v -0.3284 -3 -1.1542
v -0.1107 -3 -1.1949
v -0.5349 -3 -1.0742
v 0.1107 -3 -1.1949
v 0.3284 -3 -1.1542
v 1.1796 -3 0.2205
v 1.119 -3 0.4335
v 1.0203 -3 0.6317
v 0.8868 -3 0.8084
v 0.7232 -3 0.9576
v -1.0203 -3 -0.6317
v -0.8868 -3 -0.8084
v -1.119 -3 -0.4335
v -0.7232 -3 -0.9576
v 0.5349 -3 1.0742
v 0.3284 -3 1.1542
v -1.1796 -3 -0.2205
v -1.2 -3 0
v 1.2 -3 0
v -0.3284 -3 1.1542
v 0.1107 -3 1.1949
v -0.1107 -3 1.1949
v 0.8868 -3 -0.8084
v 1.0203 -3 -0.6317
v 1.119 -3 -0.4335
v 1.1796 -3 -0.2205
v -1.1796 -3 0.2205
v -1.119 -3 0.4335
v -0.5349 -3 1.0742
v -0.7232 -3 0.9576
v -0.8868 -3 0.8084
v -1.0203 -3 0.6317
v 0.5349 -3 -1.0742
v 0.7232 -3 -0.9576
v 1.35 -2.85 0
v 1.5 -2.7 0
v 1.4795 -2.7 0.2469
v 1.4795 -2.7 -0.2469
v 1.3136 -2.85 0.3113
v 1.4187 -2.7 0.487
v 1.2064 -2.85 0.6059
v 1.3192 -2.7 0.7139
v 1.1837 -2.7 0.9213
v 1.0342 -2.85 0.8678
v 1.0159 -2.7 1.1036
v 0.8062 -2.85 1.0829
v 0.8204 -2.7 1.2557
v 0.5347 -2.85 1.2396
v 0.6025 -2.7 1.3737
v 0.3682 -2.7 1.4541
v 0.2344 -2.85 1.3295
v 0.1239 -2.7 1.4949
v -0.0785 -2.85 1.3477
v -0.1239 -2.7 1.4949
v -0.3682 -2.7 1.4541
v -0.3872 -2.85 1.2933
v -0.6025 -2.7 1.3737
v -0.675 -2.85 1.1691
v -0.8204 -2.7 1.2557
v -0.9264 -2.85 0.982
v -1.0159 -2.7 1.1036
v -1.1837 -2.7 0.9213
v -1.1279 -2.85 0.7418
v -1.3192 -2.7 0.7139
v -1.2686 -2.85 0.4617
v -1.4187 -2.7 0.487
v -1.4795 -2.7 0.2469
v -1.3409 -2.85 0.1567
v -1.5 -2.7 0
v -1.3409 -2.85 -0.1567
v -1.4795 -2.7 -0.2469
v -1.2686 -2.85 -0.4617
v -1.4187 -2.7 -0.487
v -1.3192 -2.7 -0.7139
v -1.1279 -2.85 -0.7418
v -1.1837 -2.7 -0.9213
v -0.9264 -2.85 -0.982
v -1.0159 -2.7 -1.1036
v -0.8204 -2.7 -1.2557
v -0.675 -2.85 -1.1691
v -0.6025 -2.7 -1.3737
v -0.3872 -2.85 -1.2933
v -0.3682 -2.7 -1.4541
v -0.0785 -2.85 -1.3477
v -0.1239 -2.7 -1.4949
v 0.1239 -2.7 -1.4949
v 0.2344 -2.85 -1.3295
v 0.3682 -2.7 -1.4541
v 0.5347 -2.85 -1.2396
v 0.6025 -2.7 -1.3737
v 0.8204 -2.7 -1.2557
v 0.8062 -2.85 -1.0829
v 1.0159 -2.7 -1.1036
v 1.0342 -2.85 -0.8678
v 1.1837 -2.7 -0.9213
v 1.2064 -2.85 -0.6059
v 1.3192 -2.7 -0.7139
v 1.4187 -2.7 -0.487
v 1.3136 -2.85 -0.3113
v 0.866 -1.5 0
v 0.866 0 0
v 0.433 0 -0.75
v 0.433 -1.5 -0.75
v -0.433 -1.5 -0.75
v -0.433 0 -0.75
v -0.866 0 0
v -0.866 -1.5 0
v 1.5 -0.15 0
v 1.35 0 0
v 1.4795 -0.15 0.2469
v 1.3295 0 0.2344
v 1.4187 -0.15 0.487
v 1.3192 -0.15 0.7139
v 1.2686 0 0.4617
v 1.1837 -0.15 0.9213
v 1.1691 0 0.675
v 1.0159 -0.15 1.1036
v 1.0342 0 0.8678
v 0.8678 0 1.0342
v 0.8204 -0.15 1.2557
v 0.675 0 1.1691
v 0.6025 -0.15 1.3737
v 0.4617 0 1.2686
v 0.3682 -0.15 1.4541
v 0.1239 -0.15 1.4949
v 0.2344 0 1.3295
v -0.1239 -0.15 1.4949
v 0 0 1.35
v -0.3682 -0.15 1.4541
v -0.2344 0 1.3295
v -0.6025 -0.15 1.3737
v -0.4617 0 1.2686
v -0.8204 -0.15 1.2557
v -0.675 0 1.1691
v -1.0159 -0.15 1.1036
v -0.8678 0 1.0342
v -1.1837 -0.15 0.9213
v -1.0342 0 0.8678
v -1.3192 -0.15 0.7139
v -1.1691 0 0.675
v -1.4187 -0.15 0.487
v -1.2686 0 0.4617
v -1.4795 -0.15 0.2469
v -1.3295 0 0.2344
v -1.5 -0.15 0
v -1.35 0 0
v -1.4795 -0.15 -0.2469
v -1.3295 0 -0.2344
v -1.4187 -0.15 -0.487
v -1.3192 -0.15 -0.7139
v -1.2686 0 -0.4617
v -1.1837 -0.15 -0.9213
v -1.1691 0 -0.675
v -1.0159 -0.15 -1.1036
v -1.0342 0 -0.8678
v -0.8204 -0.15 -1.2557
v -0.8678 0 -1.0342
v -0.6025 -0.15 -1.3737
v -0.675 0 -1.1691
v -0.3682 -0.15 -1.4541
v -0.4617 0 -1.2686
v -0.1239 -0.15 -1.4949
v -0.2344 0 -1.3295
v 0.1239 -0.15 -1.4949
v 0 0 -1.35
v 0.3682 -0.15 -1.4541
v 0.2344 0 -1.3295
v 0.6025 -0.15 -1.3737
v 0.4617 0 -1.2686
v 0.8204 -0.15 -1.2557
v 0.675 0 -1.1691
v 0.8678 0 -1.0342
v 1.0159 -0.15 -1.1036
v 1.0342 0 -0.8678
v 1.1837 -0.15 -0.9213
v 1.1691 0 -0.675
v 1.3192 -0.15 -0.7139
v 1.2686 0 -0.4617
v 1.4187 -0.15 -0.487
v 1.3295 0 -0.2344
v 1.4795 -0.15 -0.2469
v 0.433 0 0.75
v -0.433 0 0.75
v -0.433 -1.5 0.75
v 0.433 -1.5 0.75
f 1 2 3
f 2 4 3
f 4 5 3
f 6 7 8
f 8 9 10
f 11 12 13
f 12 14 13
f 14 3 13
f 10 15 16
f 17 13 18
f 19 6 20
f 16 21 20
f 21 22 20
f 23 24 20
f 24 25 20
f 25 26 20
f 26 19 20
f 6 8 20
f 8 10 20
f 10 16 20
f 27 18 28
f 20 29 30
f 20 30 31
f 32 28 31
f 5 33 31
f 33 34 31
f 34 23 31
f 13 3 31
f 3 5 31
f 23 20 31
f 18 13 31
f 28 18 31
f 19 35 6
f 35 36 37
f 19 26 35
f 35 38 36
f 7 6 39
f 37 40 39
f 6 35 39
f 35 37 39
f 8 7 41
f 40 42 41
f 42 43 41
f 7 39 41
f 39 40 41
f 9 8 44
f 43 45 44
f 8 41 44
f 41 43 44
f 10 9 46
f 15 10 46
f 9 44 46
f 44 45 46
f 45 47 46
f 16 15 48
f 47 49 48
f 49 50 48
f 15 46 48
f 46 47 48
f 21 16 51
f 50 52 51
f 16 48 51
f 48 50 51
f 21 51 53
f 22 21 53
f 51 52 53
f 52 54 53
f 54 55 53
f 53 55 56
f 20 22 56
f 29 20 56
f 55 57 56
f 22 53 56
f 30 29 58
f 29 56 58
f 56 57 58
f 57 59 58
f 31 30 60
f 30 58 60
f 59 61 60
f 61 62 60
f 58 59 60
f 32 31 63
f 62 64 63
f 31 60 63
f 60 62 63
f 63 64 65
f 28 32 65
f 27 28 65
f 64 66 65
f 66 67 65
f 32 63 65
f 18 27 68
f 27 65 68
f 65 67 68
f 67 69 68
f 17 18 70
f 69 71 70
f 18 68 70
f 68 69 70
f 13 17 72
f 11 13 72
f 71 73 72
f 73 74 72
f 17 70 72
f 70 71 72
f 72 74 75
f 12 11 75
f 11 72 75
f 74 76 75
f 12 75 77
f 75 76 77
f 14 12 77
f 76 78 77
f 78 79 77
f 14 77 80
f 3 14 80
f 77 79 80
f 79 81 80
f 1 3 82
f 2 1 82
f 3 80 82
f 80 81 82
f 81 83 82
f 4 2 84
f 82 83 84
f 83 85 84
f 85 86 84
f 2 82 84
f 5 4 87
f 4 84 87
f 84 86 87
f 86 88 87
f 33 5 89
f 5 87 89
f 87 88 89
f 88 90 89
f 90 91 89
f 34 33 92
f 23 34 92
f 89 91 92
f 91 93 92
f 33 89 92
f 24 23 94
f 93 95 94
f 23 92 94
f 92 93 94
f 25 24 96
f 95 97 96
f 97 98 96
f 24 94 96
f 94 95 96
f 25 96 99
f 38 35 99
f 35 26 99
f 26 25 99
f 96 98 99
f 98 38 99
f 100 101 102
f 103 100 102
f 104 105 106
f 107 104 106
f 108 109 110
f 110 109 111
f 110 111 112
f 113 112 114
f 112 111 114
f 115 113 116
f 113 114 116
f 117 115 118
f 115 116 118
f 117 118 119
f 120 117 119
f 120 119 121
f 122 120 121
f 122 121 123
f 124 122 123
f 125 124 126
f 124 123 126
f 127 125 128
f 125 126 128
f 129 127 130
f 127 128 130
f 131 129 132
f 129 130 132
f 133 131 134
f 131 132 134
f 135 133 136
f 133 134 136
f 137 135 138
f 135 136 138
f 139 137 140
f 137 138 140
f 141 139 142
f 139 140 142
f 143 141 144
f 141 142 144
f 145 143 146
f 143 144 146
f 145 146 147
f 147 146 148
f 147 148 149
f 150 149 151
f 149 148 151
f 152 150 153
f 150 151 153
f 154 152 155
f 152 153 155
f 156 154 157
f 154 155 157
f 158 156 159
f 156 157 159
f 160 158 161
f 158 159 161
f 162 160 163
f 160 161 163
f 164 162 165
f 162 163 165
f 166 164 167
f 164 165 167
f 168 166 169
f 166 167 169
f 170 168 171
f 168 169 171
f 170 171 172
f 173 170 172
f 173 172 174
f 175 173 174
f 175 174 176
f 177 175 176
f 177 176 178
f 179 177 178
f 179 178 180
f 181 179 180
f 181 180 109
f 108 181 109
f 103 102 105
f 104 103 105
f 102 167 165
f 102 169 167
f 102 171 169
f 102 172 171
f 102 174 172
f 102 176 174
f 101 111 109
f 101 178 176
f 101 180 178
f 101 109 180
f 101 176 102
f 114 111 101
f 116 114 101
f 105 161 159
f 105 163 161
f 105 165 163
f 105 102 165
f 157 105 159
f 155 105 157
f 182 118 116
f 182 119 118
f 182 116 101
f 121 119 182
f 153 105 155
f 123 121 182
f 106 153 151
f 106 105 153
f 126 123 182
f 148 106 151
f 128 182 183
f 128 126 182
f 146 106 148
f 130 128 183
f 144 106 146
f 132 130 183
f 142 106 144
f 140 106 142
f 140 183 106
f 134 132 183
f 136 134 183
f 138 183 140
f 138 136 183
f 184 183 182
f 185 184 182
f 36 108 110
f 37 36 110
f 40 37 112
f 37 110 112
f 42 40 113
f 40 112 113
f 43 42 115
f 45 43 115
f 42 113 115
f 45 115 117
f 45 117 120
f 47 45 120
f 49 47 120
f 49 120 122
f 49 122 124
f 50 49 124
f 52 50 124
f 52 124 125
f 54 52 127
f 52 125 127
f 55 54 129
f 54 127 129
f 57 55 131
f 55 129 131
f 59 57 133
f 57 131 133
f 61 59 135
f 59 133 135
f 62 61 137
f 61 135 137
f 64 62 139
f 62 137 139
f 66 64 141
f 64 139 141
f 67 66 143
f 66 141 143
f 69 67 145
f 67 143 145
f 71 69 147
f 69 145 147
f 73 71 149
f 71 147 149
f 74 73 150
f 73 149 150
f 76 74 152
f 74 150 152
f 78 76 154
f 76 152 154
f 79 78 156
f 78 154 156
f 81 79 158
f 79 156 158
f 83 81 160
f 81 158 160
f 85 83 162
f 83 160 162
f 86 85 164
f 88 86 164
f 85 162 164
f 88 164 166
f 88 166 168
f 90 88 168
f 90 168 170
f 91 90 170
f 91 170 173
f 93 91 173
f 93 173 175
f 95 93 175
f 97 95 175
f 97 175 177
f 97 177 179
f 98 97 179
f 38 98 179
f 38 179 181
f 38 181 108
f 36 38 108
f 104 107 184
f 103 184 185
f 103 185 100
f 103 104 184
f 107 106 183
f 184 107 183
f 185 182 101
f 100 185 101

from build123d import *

# Parameters (mm, degrees)
CROQUIS1_W            = 1.5
CROQUIS1_H            = 3
CORTAR_EXTRUIR2_DEPTH = 1.5
CHAFL_N3_SIZE         = 0.3
CHAFL_N4_SIZE         = 0.15


with BuildPart() as part:
    # Croquis1 → Revolución1 (revolve)
    with BuildSketch(Plane.XY):
        with Locations((0.75, -1.5)):
            Rectangle(CROQUIS1_W, CROQUIS1_H)
    revolve(axis=Axis((0, 0, 0), (0, -1, 0)))

    # Croquis3 → Cortar-Extruir2 (cut)
    with BuildSketch(Plane(origin=(0, 0, 0), x_dir=(1, 0, 0), z_dir=(0, 1, 0))):
        Polygon((-0.433012702, 0.75), (-0.866025404, 0), (-0.433012702, -0.75), (0.433012702, -0.75), (0.866025404, 0), (0.433012702, 0.75), align=None)
    extrude(amount=-CORTAR_EXTRUIR2_DEPTH, mode=Mode.SUBTRACT)

    # Chaflán3
    chafl_n3_edges = [part.edges().sort_by_distance(p)[0] for p in [
        (-1.5, -3, 0),
    ]]
    chamfer(chafl_n3_edges, length=CHAFL_N3_SIZE)

    # Chaflán4
    chafl_n4_edges = [part.edges().sort_by_distance(p)[0] for p in [
        (-1.5, 0, 0),
    ]]
    chamfer(chafl_n4_edges, length=CHAFL_N4_SIZE)


solid = part.part
